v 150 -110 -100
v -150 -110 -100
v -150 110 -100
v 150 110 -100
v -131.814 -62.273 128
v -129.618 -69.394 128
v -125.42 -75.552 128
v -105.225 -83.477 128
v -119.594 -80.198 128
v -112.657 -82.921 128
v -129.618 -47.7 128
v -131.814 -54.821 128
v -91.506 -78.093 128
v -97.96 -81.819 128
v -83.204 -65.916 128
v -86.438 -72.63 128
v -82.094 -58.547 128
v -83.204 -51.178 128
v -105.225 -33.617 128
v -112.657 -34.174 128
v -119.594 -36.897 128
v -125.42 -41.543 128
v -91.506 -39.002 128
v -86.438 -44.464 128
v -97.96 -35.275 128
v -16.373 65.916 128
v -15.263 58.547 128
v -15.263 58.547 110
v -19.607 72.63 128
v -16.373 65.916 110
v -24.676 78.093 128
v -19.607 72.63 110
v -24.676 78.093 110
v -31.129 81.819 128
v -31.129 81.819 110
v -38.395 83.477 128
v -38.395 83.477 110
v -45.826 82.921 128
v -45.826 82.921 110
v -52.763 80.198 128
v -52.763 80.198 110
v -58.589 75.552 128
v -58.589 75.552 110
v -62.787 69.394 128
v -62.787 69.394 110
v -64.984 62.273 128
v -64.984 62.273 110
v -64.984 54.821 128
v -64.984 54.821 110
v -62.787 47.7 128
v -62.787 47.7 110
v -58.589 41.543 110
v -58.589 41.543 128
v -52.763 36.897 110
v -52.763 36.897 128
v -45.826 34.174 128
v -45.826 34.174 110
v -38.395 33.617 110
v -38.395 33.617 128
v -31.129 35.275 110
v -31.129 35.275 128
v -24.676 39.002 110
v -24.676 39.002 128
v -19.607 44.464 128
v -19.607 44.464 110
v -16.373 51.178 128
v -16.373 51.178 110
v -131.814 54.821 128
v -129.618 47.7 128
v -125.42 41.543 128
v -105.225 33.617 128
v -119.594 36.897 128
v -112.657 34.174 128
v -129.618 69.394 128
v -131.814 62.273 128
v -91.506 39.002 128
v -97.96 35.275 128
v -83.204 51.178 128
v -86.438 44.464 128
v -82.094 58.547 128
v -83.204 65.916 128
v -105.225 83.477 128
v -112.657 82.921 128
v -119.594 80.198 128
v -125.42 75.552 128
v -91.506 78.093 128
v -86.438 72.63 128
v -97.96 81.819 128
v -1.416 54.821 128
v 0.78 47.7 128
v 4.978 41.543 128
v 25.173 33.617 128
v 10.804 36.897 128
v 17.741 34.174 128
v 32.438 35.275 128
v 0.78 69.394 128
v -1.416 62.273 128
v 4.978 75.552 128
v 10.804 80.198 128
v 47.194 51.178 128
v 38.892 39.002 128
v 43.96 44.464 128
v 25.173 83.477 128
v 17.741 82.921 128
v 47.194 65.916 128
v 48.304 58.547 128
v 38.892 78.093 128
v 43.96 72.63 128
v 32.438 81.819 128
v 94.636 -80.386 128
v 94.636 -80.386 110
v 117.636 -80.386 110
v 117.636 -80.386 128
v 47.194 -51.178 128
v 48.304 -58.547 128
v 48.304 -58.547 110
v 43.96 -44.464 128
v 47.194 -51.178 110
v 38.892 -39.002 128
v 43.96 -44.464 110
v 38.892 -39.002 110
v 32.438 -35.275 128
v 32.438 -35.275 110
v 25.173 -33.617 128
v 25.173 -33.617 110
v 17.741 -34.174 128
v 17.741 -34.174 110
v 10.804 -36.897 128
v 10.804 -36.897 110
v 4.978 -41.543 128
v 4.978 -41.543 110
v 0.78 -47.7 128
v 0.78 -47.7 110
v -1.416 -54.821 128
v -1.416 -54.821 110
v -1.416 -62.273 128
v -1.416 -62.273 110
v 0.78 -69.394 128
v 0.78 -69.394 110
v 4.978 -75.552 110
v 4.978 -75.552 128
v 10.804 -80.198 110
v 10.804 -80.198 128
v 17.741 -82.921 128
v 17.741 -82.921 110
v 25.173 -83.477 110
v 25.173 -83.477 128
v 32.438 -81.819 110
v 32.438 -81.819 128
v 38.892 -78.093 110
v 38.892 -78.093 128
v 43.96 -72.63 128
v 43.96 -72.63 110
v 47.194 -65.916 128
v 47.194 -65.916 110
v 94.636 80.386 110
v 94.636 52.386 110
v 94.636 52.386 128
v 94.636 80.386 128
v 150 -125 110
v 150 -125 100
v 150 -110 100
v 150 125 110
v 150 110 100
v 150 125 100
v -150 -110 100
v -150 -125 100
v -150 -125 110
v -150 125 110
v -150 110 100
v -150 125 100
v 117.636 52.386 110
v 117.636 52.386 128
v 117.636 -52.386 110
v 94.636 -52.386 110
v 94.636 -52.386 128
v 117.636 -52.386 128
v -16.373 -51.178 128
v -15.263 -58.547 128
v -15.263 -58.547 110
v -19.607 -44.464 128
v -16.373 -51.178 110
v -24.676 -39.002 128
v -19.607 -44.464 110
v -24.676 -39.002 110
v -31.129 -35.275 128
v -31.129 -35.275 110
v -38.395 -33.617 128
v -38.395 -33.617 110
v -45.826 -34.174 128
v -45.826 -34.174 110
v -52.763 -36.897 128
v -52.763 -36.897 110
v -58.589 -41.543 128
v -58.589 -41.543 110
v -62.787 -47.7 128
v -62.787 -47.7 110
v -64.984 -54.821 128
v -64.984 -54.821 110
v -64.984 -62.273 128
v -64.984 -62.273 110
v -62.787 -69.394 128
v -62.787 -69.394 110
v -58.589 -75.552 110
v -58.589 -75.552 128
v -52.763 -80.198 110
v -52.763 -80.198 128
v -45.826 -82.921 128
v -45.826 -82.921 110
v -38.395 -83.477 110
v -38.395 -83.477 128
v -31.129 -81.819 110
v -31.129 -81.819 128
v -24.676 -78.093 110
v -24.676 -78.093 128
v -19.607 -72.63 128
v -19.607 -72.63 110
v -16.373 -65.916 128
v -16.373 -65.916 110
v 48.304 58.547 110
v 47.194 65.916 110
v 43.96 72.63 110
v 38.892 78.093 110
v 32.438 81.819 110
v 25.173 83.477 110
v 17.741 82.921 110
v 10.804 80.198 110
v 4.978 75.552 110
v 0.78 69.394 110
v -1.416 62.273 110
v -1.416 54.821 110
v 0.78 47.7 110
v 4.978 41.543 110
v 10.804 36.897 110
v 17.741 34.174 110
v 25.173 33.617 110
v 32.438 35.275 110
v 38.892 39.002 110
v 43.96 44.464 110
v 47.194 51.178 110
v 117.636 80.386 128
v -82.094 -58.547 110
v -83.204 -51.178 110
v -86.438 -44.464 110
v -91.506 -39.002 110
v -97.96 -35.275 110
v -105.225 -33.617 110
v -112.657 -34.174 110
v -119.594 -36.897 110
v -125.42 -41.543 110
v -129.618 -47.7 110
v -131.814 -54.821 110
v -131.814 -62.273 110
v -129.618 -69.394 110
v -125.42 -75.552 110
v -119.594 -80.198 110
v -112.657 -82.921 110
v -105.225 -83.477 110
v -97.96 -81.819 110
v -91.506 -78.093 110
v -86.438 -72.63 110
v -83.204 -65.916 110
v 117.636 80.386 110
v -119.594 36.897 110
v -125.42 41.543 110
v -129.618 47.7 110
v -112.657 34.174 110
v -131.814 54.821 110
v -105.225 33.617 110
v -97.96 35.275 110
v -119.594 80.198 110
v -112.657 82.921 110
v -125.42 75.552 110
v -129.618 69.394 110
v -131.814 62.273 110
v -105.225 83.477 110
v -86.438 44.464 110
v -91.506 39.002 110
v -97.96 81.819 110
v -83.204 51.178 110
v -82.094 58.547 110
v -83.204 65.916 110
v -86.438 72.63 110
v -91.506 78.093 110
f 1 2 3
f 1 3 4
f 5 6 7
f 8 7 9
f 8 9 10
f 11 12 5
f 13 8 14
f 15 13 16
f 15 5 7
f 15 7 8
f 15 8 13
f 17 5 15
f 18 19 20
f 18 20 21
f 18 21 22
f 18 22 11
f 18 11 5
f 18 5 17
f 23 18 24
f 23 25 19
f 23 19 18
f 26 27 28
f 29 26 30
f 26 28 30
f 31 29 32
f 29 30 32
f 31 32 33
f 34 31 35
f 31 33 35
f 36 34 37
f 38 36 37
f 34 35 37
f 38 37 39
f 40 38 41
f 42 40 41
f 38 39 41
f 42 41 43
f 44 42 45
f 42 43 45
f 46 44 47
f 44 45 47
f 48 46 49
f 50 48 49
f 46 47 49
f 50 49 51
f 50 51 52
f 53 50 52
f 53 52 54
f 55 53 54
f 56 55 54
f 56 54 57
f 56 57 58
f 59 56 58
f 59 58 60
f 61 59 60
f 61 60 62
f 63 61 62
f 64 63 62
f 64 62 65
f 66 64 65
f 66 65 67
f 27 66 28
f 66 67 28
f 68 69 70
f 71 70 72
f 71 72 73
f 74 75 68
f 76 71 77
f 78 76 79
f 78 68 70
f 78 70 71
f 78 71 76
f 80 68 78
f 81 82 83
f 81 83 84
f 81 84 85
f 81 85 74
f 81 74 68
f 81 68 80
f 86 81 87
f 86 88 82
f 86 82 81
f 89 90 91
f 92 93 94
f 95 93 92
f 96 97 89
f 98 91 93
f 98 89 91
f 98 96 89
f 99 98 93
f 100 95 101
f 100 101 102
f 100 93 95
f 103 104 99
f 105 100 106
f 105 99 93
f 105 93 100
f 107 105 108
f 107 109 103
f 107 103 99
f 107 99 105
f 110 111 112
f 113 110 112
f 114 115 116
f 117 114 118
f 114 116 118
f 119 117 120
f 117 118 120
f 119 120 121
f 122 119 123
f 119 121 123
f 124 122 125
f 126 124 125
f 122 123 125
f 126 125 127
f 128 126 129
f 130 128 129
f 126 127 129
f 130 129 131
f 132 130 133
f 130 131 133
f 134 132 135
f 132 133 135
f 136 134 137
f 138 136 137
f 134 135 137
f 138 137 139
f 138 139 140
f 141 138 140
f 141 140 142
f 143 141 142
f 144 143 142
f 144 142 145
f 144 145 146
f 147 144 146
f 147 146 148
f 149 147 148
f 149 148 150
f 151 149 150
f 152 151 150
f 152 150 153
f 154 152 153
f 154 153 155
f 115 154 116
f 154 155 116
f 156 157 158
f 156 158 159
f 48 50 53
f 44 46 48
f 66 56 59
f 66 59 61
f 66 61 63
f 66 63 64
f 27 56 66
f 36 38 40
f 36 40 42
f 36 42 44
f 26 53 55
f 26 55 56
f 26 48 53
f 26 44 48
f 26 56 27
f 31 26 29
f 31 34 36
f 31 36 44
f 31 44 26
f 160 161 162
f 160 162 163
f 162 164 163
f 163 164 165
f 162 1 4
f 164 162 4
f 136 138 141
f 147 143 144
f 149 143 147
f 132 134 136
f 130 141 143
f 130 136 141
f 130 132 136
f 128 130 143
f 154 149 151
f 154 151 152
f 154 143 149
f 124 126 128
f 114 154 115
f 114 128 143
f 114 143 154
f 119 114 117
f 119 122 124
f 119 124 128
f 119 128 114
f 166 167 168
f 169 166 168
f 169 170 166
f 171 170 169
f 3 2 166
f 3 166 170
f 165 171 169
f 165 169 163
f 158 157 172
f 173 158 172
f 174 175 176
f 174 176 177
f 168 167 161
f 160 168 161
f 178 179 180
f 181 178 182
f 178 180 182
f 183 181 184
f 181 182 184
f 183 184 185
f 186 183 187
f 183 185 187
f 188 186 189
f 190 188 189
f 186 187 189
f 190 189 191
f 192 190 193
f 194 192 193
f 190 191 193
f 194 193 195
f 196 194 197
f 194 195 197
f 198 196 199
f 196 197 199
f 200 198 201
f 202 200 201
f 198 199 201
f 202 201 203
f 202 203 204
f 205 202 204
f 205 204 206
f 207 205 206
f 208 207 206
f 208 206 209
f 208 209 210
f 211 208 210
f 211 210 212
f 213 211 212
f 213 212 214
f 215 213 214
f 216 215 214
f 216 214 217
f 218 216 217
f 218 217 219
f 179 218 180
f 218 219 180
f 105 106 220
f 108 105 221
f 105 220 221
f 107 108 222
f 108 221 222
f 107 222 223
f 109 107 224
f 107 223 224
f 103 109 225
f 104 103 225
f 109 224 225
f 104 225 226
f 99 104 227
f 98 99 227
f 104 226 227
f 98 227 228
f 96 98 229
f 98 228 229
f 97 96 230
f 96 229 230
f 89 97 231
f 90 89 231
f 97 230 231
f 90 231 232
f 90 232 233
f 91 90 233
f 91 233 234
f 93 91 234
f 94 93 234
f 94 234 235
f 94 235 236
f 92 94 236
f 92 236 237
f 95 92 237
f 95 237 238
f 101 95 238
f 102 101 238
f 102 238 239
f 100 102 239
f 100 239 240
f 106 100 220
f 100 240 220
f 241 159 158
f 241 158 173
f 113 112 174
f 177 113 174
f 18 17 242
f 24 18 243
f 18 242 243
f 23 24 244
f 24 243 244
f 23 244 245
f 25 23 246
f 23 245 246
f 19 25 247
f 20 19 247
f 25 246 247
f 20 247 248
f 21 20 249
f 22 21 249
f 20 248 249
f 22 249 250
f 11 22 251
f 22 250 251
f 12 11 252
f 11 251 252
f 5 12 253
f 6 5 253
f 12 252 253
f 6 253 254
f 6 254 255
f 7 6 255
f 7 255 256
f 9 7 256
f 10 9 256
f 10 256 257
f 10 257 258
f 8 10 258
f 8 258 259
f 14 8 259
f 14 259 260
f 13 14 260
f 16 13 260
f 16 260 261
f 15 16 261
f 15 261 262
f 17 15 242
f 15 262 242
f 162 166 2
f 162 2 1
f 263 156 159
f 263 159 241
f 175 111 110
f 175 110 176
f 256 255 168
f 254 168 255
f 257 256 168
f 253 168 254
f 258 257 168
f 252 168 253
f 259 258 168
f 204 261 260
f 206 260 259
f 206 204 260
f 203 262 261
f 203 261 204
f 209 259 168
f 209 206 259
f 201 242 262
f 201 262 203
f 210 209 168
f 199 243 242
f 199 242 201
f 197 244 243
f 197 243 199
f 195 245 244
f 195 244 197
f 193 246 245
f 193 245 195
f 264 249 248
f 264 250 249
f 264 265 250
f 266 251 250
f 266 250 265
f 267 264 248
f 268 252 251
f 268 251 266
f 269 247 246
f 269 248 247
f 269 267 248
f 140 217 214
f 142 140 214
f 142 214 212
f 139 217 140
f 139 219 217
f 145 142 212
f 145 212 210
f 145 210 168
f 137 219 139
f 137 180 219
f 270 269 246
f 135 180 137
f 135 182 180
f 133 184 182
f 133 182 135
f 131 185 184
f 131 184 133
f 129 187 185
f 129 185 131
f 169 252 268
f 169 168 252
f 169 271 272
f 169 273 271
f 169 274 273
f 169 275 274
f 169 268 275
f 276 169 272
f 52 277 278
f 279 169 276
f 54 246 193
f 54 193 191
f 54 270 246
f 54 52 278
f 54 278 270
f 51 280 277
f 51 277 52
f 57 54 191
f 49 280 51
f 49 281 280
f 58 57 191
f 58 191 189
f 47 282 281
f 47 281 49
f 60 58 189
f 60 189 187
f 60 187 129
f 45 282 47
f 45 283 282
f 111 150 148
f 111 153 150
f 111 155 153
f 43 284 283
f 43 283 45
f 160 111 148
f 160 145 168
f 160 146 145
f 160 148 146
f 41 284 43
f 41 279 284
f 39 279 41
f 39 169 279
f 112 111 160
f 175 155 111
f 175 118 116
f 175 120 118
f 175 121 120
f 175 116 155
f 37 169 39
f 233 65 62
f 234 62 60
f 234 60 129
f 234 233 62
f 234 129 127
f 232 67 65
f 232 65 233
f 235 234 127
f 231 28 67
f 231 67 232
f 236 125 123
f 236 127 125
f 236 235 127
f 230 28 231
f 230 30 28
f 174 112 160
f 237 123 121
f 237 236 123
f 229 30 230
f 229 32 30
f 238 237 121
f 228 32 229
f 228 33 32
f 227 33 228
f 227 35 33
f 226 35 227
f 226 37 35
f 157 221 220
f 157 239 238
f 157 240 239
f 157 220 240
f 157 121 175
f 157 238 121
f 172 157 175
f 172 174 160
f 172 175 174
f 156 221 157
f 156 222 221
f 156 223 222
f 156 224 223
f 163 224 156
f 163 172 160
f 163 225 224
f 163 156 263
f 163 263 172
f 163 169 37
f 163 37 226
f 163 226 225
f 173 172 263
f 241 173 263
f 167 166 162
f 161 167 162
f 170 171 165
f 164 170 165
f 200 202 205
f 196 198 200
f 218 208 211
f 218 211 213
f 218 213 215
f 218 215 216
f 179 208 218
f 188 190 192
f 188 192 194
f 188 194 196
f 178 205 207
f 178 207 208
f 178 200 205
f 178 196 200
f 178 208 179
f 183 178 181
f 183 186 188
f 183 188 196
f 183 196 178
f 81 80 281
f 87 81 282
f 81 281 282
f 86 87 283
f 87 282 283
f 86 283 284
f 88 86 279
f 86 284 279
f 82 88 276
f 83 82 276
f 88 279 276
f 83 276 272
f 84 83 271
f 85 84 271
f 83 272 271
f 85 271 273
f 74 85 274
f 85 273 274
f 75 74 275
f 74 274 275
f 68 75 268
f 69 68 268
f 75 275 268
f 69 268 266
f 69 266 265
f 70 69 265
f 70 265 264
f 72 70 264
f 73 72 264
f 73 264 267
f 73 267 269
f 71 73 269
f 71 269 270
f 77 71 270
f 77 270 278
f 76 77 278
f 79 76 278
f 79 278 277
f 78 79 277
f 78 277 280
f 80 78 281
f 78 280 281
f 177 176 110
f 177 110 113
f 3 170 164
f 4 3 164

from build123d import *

# Parameters (mm, degrees)
F0_W     = 300
F0_H     = 200
F1_DEPTH = 110
F2_W     = 300
F2_H     = 250
F3_DEPTH = 10
F4_R     = 25
F4_W     = 23
F4_H     = 28
F5_DEPTH = 18


with BuildPart() as f1:
    # F0 (on Front) → F1 (new body, symmetric)
    with BuildSketch(Plane.XZ):
        Rectangle(F0_W, F0_H)
    extrude(amount=F1_DEPTH, both=True)

    # F2 (on face) → F3 (join)
    with BuildSketch(Plane.XY.offset(100)):
        Rectangle(F2_W, F2_H)
    extrude(amount=F3_DEPTH)

    # F4 (on face) → F5 (join)
    with BuildSketch(Plane.XY.offset(110)):
        with Locations((-107.0935577154, 58.547321707)):
            Circle(F4_R)
        with Locations((-40.2627661824, 58.547321707)):
            Circle(F4_R)
        with Locations((23.3044344932, 58.547321707)):
            Circle(F4_R)
        with Locations((-107.0935577154, -58.547321707)):
            Circle(F4_R)
        with Locations((-40.2627661824, -58.547321707)):
            Circle(F4_R)
        with Locations((23.3044344932, -58.547321707)):
            Circle(F4_R)
        with Locations((106.136246562, 66.3863844573)):
            Rectangle(F4_W, F4_H)
        with Locations((106.136246562, -66.3863844573)):
            Rectangle(F4_W, F4_H)
    extrude(amount=F5_DEPTH)


solid = f1.part
